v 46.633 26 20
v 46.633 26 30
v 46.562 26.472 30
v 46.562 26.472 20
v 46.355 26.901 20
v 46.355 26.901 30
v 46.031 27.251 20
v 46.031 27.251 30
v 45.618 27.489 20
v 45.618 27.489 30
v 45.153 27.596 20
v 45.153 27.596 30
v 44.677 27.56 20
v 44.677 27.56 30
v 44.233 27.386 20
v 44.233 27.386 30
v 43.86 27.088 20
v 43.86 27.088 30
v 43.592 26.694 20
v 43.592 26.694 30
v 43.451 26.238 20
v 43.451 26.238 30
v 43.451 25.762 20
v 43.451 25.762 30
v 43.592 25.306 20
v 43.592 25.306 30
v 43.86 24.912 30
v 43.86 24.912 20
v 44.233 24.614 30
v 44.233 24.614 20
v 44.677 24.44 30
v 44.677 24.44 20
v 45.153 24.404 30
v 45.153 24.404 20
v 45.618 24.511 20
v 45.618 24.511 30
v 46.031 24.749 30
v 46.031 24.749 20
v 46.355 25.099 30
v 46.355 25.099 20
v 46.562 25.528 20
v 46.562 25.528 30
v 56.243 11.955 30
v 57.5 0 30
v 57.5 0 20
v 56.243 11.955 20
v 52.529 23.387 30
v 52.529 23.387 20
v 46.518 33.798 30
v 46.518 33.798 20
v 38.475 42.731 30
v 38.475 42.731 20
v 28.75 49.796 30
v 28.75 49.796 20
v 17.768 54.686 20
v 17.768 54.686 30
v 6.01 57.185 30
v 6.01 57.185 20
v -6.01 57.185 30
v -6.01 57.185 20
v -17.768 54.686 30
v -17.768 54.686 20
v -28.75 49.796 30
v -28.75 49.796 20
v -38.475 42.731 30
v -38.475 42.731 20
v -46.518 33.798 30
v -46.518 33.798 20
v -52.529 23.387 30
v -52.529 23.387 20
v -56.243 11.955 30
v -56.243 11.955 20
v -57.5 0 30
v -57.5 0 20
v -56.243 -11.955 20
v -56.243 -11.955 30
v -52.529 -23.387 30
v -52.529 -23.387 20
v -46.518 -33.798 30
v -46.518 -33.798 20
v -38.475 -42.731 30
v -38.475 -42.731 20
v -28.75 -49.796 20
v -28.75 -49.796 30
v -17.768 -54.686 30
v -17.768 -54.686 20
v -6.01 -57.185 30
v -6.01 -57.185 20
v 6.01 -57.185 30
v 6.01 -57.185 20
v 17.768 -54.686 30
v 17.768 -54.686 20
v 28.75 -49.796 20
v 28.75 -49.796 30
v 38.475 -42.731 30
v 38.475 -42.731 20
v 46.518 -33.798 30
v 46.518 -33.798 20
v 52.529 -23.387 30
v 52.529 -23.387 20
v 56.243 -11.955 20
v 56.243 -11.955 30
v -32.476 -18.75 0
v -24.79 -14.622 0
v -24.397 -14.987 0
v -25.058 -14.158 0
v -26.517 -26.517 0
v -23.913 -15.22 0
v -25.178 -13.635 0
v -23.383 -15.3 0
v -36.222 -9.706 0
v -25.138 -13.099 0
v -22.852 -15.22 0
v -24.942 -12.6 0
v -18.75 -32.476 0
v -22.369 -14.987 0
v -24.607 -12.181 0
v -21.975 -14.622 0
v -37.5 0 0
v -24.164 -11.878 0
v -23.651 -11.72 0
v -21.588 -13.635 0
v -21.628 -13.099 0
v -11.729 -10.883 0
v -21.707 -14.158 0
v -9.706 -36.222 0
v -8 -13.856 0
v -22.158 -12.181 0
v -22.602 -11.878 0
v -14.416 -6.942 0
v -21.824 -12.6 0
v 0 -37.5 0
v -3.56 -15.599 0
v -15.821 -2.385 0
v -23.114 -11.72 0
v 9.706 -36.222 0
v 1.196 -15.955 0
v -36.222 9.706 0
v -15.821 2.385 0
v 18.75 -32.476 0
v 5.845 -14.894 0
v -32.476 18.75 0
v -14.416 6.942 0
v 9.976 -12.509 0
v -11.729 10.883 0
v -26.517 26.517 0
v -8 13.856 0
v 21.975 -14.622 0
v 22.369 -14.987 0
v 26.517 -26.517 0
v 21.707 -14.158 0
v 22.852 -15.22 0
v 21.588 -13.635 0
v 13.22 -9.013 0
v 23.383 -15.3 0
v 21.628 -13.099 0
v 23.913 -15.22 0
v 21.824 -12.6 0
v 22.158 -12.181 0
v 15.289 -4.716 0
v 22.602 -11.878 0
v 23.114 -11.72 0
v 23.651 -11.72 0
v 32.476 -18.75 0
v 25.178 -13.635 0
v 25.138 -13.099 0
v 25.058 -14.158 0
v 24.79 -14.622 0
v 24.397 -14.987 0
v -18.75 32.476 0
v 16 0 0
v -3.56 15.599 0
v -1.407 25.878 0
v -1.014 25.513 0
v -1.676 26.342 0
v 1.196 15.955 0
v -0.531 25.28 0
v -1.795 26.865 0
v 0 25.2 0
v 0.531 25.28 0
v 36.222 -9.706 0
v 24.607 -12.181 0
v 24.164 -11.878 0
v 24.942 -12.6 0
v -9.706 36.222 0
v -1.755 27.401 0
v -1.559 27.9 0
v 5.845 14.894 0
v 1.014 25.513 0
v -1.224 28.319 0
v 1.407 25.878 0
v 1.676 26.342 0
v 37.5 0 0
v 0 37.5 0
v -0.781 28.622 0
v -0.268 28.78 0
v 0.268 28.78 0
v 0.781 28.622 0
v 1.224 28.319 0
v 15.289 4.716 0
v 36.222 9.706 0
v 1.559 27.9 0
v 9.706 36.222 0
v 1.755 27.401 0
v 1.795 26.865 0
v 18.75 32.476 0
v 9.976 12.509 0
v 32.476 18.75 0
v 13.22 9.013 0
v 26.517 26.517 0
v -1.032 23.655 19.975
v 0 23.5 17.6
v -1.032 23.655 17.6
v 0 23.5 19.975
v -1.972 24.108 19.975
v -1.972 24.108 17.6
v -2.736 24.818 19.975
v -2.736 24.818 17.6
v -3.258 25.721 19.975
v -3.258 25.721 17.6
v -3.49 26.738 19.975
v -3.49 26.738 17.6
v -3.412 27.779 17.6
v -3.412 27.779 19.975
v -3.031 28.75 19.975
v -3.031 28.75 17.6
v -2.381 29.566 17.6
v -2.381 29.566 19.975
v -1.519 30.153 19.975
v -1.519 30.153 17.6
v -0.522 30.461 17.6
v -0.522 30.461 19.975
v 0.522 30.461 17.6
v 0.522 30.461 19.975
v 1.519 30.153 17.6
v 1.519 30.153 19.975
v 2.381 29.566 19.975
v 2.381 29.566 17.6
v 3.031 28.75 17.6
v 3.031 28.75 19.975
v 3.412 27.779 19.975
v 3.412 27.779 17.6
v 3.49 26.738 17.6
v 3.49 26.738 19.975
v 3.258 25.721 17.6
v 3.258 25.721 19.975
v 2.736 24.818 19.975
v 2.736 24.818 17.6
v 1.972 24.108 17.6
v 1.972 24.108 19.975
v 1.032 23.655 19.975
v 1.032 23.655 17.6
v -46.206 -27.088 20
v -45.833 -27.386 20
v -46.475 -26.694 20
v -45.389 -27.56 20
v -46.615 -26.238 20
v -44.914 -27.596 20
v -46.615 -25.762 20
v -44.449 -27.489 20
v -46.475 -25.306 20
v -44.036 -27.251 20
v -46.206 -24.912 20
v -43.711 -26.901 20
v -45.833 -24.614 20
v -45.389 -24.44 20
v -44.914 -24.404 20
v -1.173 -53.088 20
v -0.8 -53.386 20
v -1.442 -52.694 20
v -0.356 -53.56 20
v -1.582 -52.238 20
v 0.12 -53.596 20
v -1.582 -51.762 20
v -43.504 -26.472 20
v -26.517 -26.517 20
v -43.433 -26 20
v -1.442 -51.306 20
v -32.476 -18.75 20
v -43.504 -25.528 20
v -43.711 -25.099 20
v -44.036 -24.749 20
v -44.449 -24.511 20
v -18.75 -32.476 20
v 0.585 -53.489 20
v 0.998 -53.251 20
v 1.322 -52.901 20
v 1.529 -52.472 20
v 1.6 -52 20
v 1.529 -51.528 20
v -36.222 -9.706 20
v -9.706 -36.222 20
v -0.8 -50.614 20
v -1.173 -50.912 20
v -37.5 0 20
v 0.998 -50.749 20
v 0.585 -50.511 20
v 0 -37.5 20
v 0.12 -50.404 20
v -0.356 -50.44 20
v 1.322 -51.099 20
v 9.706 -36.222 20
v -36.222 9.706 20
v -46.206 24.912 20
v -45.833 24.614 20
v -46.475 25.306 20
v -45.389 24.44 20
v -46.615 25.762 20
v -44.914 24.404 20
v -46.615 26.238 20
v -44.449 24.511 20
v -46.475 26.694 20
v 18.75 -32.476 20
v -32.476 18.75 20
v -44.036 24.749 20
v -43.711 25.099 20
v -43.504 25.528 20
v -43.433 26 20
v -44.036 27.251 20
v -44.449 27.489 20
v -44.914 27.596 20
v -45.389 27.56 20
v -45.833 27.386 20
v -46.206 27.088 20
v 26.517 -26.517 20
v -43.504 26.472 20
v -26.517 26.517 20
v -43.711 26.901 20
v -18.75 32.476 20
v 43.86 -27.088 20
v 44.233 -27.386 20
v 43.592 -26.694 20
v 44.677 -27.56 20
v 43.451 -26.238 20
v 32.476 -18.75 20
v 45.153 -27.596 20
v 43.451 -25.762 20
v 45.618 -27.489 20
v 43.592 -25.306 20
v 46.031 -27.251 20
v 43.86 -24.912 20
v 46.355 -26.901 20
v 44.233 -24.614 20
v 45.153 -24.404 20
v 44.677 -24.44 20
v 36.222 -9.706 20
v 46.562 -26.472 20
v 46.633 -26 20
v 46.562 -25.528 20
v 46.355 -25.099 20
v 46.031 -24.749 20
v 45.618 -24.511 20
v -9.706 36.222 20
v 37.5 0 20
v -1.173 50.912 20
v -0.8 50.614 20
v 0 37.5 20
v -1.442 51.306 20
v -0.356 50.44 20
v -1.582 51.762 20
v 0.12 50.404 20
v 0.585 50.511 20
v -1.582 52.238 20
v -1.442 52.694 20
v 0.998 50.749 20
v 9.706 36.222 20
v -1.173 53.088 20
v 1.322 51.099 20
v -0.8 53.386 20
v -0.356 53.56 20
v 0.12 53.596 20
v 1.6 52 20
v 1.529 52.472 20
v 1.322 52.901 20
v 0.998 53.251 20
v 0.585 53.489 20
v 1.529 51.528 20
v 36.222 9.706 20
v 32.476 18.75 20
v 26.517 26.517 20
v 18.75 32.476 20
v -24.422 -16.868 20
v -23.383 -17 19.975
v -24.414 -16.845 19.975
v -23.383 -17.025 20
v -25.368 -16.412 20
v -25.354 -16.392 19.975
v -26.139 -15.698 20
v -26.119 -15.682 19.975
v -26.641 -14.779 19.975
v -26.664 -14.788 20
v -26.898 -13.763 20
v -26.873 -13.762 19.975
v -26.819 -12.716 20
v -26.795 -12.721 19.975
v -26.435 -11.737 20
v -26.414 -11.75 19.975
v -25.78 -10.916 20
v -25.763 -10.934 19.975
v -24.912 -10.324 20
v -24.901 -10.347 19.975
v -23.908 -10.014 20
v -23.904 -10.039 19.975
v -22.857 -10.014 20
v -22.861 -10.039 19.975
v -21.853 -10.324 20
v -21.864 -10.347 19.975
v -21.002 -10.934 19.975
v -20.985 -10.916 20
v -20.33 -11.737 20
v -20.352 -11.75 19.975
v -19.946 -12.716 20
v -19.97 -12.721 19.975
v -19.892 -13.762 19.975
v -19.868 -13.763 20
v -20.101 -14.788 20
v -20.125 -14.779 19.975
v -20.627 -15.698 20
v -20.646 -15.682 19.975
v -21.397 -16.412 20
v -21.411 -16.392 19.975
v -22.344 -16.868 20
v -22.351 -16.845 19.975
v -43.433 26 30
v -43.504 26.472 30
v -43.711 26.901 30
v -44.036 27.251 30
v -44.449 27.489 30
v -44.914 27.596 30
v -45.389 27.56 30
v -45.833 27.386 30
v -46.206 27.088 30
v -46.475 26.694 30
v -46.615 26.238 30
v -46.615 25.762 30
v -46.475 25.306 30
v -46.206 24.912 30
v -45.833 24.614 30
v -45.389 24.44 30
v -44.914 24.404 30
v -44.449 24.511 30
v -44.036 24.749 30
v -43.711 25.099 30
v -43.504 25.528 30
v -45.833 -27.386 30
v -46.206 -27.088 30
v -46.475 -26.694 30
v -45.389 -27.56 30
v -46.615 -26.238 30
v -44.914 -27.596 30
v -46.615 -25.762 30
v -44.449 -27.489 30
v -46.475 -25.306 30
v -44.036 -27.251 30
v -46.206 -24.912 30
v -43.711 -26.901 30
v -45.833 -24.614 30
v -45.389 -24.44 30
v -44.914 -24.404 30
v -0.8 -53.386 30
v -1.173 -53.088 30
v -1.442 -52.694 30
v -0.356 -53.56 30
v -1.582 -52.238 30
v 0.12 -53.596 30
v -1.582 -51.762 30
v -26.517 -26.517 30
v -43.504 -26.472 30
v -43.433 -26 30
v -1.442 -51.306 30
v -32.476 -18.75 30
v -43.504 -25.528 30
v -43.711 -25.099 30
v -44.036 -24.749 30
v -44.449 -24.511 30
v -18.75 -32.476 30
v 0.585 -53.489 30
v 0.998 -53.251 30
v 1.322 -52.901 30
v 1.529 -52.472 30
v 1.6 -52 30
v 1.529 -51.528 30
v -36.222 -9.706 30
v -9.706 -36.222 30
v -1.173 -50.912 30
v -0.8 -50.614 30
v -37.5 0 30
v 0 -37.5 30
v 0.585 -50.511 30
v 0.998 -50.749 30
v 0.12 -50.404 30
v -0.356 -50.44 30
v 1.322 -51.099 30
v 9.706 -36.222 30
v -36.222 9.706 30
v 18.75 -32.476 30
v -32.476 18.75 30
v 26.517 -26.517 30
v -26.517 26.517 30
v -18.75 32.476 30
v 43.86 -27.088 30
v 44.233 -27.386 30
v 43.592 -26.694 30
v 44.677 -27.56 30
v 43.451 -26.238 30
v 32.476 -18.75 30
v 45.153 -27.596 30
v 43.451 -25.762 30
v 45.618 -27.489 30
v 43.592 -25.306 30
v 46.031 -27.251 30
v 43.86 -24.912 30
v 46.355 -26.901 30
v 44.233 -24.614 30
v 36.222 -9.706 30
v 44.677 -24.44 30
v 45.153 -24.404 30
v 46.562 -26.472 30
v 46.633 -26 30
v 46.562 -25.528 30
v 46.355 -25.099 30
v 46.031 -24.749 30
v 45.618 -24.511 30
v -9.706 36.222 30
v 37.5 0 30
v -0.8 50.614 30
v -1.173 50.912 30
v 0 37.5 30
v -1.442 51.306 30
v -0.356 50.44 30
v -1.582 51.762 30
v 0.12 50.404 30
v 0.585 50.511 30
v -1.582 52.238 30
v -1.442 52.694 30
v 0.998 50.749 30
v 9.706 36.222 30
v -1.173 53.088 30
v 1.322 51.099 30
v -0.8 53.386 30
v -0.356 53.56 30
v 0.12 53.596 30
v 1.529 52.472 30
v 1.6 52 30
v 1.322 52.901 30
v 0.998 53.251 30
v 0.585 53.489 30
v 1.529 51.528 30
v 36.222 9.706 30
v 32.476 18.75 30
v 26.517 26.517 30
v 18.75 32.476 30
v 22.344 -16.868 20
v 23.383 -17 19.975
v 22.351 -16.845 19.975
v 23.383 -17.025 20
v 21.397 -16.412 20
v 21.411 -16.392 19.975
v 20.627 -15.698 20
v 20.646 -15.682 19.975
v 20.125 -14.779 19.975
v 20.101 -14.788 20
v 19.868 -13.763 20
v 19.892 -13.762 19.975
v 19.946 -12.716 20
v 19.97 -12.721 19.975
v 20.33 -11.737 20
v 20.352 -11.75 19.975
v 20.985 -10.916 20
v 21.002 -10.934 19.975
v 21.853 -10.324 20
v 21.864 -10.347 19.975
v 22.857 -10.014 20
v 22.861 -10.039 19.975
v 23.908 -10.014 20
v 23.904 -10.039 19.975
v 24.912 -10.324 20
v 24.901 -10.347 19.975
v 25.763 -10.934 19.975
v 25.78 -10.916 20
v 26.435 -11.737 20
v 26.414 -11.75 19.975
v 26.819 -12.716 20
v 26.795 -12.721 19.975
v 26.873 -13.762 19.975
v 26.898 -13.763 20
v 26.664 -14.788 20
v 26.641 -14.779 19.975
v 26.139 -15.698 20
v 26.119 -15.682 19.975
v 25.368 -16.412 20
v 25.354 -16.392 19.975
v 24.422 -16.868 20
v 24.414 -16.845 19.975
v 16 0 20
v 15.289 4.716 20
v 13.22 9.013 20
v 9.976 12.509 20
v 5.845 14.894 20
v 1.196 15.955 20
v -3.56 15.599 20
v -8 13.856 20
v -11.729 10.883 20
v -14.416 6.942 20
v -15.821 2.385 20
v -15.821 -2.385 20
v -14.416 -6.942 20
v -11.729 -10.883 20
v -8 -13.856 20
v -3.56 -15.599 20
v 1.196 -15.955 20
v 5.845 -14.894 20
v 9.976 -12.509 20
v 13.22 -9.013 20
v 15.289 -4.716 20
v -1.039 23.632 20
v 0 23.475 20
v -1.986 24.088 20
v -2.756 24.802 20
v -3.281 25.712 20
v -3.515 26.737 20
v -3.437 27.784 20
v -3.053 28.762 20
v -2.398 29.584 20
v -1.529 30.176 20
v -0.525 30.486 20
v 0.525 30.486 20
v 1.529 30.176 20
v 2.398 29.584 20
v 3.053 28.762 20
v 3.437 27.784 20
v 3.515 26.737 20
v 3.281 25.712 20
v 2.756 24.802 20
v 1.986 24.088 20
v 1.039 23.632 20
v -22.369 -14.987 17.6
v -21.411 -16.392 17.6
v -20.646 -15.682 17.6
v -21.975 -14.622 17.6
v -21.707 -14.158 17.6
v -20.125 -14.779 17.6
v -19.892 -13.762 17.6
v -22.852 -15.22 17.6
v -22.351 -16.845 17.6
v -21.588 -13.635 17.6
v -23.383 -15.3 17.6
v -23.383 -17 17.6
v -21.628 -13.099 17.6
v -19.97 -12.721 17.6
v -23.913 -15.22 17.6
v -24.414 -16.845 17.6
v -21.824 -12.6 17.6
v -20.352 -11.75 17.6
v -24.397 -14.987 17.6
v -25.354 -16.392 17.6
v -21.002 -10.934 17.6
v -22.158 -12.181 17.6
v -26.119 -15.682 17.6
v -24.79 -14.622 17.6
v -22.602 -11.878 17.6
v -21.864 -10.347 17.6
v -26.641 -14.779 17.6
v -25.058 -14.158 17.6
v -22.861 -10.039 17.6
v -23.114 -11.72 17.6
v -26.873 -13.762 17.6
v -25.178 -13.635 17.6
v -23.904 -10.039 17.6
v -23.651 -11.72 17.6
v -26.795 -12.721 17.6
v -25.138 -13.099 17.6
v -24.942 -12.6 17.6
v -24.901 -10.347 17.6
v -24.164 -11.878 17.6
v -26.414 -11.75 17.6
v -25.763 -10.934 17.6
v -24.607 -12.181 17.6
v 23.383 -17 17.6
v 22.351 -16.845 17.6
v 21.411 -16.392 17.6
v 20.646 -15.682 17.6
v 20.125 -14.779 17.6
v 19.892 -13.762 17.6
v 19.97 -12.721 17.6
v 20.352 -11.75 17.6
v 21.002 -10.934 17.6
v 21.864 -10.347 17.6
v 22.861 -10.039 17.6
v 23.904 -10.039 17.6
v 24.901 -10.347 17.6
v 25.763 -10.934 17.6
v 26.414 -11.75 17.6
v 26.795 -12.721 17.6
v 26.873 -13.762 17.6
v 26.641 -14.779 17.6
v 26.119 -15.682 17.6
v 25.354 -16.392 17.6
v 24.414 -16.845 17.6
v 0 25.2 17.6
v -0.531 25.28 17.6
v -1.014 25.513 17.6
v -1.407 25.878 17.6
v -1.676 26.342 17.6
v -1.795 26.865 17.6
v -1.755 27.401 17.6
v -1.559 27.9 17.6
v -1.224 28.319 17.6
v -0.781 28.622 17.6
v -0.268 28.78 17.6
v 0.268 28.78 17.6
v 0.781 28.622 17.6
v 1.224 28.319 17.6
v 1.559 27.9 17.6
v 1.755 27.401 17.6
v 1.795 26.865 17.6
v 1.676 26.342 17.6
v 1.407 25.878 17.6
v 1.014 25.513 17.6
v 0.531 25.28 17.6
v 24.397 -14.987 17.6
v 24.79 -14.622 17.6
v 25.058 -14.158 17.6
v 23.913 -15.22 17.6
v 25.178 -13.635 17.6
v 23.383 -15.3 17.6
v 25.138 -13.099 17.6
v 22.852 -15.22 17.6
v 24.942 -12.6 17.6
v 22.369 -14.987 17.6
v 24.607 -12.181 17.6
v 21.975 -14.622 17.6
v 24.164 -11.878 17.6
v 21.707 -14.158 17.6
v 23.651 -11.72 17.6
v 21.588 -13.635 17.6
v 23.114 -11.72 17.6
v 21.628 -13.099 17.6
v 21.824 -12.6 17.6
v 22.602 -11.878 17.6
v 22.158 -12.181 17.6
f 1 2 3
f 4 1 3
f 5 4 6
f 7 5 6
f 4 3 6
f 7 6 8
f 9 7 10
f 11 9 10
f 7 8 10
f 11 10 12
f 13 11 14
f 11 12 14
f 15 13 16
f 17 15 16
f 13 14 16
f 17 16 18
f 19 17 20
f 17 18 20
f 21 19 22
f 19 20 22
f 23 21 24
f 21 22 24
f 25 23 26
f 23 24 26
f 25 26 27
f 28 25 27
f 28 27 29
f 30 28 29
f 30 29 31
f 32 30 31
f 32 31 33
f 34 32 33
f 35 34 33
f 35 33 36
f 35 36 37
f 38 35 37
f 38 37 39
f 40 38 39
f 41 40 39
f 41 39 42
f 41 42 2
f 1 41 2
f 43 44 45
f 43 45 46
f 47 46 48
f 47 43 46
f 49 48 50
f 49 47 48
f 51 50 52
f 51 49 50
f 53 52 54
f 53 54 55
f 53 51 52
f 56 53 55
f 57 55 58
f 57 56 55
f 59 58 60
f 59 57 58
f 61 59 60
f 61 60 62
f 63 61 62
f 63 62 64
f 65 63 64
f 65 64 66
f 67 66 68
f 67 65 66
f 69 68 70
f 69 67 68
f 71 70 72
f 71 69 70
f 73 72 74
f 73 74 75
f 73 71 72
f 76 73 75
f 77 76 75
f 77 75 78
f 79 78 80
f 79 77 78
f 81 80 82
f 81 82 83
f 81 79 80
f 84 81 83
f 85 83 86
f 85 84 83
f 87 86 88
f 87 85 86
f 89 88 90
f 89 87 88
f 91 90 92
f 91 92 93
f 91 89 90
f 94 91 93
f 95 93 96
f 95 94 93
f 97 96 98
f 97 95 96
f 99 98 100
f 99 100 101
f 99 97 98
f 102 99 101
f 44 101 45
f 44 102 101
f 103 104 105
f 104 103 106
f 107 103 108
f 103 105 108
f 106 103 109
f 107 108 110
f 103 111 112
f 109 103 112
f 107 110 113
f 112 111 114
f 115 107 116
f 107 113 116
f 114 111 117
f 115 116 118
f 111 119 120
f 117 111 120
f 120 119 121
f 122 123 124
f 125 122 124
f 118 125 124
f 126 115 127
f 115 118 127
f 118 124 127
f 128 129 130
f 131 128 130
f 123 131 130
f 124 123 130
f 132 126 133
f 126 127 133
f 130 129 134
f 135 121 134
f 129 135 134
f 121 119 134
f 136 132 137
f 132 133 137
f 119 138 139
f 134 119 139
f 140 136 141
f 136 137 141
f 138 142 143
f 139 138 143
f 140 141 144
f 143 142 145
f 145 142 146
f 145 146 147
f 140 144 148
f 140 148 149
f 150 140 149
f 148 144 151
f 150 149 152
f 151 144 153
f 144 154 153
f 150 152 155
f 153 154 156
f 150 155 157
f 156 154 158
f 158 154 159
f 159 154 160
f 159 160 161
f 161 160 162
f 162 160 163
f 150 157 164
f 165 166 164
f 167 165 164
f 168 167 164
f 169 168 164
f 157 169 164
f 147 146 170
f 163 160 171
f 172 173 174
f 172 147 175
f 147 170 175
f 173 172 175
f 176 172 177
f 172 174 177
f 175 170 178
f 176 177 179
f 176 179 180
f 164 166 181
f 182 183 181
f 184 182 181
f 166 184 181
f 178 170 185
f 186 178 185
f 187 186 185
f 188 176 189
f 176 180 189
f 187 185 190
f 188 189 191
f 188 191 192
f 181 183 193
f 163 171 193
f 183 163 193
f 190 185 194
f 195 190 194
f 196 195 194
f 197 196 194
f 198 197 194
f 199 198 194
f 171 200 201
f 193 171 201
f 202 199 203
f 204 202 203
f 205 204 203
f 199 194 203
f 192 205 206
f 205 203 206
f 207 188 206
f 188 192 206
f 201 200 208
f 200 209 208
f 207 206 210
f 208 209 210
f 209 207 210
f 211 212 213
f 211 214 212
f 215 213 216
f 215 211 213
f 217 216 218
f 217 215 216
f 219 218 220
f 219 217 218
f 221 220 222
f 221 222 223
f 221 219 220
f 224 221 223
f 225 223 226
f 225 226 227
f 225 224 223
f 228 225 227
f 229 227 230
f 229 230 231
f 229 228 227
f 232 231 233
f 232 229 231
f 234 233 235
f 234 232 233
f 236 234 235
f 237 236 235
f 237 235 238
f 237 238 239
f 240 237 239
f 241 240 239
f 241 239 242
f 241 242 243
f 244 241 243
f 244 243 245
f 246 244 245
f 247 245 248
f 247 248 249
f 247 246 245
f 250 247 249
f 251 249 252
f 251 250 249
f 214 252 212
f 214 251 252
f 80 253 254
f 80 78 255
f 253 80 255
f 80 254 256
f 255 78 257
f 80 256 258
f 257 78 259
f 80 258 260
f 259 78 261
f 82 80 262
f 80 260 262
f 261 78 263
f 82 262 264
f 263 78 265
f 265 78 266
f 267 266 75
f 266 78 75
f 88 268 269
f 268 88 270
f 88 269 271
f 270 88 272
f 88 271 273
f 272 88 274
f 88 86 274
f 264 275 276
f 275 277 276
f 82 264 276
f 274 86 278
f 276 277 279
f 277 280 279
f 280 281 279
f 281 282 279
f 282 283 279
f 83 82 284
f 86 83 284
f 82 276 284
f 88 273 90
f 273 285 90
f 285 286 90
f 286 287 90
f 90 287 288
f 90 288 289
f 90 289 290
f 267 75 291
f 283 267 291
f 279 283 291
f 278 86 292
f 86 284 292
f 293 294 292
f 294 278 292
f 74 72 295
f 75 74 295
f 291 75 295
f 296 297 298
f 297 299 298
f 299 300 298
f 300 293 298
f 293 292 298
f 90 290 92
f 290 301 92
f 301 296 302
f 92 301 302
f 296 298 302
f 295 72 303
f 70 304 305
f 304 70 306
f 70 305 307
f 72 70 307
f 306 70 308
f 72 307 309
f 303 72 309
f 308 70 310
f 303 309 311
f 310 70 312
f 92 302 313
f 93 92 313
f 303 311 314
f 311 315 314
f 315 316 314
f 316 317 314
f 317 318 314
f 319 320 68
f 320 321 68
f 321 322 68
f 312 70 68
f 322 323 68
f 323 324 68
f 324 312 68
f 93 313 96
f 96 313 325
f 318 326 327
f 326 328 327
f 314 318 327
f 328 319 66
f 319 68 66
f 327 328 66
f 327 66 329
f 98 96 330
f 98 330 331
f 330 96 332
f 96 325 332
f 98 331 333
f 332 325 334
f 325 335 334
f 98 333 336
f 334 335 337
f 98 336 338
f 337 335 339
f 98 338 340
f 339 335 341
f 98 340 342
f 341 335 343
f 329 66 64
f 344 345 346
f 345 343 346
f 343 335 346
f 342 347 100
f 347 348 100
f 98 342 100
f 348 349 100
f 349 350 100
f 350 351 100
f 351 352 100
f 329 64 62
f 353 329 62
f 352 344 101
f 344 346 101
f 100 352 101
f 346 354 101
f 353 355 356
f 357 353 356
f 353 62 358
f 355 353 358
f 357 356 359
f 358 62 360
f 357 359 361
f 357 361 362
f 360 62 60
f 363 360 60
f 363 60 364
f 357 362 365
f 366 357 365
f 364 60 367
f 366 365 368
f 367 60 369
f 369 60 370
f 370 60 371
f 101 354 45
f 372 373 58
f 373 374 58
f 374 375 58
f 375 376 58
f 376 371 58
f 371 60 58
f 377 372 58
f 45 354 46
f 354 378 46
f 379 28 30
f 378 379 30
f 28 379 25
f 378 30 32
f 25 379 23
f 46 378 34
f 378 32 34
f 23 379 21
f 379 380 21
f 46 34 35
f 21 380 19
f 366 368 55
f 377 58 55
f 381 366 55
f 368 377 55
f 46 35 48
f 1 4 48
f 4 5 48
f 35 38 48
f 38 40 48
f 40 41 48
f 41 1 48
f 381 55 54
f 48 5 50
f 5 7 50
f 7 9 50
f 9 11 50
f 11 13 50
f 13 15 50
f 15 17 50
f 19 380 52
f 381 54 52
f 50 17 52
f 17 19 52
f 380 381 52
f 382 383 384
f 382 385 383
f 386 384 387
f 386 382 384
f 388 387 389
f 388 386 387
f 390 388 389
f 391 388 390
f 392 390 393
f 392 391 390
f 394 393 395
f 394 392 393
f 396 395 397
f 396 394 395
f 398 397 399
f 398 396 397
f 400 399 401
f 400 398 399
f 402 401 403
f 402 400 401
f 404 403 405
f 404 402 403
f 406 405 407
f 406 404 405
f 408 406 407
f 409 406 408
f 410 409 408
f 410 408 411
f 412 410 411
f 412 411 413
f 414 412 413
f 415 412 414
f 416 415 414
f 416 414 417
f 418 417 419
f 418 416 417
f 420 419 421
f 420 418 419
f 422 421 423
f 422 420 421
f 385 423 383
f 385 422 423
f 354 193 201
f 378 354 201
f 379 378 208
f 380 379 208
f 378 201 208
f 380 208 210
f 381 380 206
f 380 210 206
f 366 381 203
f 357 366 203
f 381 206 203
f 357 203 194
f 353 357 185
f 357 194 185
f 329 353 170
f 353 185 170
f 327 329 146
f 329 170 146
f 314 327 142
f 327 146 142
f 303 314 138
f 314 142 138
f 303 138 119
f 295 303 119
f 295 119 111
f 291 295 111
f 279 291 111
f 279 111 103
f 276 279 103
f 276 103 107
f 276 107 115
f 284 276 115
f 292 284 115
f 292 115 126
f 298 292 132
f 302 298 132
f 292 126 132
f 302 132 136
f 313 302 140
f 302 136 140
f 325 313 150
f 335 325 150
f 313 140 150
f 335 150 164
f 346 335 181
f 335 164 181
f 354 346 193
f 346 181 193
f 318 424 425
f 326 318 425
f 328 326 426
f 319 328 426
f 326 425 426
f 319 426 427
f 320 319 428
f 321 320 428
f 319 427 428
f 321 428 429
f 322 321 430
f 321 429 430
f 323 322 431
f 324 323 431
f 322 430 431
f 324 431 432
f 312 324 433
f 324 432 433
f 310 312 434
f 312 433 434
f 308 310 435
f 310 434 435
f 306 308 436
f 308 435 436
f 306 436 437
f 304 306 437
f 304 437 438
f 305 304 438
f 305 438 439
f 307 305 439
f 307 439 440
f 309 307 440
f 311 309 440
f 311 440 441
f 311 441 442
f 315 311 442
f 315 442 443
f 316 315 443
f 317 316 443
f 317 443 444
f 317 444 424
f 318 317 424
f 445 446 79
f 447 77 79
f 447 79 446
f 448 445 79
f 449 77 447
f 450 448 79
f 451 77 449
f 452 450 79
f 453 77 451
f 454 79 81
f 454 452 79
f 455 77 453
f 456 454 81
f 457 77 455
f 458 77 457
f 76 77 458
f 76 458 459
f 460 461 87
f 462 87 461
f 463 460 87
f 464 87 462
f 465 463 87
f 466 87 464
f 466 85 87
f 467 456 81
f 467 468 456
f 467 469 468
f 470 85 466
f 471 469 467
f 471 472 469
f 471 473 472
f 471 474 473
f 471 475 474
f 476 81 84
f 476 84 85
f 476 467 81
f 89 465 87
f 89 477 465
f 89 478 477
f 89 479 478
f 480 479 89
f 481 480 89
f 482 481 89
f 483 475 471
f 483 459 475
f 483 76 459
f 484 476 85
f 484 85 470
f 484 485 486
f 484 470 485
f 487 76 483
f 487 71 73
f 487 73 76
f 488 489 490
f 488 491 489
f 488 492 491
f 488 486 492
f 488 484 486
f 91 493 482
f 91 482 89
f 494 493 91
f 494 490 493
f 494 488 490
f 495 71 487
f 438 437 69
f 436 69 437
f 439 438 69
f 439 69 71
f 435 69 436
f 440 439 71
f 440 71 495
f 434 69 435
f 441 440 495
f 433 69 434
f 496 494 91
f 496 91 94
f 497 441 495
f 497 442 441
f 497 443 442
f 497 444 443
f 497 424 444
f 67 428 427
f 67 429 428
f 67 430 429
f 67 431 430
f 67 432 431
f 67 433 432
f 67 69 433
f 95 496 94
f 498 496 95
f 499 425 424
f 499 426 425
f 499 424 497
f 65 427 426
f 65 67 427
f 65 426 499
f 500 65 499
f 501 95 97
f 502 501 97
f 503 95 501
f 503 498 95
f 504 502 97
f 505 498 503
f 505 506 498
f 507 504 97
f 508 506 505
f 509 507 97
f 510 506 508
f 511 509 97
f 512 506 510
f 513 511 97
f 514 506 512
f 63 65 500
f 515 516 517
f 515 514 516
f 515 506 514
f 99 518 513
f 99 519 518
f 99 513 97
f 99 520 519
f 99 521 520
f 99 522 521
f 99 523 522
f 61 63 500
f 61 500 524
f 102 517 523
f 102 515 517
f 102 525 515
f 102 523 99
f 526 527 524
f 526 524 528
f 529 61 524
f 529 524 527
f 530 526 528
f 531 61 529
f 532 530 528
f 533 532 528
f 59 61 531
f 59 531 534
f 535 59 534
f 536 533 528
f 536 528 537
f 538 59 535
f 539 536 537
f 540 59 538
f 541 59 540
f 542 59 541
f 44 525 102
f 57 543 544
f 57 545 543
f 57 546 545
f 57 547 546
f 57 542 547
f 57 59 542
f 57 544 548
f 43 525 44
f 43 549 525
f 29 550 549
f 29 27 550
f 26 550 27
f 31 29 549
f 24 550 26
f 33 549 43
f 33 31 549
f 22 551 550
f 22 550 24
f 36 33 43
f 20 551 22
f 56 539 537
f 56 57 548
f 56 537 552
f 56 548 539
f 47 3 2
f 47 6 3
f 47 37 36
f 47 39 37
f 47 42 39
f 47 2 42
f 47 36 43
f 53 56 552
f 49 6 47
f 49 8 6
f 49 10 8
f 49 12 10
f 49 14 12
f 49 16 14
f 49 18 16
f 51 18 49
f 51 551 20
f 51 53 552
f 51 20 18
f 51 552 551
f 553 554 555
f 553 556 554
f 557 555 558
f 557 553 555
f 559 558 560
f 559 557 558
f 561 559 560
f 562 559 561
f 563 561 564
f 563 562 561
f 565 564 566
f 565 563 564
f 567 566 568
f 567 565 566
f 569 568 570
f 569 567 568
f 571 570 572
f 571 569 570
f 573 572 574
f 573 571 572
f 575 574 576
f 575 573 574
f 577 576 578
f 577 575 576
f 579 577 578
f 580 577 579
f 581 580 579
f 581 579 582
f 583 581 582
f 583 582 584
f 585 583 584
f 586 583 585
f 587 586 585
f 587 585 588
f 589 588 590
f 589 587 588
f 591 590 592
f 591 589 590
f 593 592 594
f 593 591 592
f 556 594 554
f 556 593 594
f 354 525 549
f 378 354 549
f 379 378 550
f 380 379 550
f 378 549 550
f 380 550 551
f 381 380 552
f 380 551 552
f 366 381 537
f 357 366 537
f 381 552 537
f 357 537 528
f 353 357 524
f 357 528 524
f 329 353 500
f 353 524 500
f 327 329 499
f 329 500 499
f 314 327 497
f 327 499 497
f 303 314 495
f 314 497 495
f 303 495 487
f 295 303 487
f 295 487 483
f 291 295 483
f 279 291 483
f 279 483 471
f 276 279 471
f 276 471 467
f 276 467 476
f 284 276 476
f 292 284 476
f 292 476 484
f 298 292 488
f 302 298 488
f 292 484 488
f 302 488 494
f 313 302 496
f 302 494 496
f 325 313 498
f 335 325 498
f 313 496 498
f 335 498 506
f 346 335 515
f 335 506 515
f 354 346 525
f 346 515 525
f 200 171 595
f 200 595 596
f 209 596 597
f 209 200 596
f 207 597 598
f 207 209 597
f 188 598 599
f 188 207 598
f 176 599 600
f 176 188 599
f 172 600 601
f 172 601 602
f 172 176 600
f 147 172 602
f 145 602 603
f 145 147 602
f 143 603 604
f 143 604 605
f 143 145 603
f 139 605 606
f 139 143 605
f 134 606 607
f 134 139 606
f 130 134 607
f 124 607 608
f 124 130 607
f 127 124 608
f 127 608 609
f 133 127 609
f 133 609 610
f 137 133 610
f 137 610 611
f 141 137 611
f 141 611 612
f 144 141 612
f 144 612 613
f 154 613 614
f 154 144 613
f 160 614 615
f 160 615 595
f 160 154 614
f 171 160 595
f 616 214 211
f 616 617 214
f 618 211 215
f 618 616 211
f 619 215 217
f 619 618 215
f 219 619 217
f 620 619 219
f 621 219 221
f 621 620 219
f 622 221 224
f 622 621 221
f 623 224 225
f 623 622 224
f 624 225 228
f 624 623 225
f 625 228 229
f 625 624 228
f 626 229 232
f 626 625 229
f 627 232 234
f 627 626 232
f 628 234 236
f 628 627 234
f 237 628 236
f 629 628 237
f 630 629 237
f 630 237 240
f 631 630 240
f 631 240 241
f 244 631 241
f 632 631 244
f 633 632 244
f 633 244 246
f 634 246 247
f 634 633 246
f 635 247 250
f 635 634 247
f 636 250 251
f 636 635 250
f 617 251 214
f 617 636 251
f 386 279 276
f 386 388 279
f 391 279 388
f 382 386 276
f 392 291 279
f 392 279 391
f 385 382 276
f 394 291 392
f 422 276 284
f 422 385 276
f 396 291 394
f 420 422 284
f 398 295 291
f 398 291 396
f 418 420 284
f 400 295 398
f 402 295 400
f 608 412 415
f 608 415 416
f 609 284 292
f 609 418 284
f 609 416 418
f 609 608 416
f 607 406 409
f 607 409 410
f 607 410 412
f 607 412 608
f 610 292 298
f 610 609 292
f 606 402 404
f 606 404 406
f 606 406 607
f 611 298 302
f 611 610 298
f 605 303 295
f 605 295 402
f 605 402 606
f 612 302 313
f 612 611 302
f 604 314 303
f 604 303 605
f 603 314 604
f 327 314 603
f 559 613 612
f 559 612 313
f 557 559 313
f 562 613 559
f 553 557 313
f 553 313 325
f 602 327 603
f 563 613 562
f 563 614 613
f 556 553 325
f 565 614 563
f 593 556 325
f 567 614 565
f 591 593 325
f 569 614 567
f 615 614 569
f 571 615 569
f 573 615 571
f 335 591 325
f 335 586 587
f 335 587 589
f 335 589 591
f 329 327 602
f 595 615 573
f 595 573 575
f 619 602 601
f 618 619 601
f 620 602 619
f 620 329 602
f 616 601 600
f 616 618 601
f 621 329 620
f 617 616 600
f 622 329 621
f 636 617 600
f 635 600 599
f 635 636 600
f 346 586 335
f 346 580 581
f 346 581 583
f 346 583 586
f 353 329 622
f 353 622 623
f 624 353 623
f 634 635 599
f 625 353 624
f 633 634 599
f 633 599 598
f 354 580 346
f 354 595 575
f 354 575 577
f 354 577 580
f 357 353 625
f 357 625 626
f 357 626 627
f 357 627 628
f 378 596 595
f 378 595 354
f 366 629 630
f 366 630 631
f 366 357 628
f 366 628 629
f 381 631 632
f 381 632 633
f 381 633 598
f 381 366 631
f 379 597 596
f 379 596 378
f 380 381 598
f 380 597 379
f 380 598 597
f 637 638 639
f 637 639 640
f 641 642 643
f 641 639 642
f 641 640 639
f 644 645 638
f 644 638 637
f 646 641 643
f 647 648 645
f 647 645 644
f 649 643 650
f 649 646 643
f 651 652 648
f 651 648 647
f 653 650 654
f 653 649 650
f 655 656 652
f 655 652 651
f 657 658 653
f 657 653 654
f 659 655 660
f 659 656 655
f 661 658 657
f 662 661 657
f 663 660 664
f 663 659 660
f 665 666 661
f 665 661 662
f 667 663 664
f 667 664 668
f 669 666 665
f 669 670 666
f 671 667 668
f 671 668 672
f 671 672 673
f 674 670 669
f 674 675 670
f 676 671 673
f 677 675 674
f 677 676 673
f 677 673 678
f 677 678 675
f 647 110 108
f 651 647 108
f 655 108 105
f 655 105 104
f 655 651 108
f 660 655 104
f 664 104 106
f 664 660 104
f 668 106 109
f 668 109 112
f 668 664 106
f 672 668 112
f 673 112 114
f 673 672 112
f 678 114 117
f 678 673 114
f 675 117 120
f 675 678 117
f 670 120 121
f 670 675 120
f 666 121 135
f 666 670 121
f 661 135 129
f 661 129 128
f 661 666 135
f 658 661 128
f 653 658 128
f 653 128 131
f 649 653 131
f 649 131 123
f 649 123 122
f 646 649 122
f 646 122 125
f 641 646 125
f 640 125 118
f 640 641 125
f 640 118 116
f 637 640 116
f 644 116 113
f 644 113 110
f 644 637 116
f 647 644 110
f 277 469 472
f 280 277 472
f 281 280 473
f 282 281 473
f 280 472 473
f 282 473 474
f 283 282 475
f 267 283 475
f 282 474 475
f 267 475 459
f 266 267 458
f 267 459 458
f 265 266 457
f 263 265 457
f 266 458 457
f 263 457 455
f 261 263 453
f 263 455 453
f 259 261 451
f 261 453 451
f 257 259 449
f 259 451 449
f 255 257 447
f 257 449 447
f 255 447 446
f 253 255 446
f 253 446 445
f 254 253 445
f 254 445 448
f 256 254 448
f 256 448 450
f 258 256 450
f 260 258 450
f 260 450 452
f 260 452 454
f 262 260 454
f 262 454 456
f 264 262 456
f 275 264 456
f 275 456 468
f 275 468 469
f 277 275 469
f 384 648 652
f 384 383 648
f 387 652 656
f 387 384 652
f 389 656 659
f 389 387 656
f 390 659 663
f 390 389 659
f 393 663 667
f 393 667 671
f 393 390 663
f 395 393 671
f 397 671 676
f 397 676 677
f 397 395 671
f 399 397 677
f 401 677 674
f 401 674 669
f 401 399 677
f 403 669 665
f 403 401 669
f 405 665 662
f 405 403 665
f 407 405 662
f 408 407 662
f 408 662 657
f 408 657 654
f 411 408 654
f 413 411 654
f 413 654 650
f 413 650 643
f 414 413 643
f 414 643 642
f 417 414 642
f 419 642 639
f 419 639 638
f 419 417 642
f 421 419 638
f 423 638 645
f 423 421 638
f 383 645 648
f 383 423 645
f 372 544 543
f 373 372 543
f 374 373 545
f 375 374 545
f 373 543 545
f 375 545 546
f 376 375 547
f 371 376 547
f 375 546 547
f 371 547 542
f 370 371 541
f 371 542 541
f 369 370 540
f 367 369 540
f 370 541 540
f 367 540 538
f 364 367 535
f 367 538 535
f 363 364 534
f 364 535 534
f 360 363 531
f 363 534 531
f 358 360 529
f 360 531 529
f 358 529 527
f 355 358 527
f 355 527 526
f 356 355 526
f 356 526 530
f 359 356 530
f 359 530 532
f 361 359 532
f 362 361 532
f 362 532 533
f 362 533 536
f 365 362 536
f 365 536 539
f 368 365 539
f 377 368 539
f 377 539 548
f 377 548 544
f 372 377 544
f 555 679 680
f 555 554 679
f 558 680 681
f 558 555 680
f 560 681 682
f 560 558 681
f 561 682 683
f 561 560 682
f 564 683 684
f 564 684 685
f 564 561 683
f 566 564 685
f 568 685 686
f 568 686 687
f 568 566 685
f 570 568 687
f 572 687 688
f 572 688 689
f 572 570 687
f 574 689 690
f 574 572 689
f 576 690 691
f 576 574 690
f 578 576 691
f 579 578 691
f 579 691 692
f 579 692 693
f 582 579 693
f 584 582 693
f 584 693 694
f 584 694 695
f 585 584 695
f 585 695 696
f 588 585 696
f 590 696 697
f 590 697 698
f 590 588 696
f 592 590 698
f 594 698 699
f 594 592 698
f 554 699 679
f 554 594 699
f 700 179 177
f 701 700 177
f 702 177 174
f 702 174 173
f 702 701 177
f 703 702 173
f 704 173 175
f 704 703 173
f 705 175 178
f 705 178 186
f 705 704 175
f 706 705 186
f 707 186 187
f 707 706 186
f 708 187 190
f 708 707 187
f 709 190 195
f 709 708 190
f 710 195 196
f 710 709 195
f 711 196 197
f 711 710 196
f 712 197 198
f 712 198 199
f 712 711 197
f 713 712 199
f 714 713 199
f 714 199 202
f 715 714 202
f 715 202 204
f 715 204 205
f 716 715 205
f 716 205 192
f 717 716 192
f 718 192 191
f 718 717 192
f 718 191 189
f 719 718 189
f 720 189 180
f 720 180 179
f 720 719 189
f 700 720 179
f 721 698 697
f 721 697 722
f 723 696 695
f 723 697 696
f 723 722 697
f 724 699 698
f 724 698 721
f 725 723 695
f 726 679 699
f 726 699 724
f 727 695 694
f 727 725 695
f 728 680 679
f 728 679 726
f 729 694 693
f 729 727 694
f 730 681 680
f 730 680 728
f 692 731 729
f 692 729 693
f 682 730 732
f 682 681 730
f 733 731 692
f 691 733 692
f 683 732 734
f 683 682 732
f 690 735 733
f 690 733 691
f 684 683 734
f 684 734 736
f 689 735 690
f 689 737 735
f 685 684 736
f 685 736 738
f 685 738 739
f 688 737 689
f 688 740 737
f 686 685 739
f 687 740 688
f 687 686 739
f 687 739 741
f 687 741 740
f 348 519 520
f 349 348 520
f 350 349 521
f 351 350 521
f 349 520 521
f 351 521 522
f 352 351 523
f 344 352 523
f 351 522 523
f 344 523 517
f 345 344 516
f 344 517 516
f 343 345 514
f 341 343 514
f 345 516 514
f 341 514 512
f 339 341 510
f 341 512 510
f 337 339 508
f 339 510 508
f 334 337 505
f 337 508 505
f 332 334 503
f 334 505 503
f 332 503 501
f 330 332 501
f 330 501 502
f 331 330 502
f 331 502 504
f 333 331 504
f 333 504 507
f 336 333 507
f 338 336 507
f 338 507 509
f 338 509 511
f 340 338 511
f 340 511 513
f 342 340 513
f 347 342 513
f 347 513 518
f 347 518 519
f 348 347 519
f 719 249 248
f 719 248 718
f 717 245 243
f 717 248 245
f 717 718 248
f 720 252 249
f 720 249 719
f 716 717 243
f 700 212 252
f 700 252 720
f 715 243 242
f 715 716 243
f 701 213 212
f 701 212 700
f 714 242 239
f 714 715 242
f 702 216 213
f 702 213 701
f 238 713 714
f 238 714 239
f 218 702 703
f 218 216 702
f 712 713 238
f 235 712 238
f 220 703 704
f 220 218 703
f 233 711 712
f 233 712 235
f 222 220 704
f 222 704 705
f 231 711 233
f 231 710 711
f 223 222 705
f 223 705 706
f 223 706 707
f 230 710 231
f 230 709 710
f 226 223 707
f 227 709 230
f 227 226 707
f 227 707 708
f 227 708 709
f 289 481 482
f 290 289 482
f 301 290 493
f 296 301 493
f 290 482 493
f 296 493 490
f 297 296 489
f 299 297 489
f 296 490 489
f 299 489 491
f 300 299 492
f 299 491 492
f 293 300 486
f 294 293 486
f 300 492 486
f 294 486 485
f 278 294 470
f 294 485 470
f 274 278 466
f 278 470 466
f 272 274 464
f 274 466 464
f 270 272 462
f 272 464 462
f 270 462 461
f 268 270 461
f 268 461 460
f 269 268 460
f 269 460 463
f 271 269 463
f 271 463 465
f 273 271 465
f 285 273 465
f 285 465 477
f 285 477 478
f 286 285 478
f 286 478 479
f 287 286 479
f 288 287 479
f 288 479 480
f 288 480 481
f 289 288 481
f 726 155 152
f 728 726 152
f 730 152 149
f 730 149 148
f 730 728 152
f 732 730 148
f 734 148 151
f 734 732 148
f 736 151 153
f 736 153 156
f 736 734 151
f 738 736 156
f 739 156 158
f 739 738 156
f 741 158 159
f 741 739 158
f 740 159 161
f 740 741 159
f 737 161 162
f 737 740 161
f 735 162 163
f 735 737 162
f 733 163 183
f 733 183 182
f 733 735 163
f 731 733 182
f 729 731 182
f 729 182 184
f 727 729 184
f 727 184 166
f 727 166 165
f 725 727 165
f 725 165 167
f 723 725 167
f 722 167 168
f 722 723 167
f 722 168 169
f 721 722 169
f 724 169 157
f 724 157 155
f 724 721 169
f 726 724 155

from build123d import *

# Parameters (mm, degrees)
SKETCH1_R                                     = 37.5
SKETCH1_R_2                                   = 16
BOSS_EXTRUDE1_DEPTH                           = 20
CBORE_FOR_M3_PAN_HEAD_MACHINE_SCREW1_AT_COUNT = 2
CBORE_FOR_M3_PAN_HEAD_MACHINE_SCREW1_AT_PITCH = 46.765371804
CBORE_FOR_M3_PAN_HEAD_MACHINE_SCREW1_2_COUNT  = 2
CBORE_FOR_M3_PAN_HEAD_MACHINE_SCREW1_2_PITCH  = 46.765371804
SKETCH8_R                                     = 57.5
SKETCH8_R_2                                   = 37.5
BOSS_EXTRUDE3_DEPTH                           = 10
SKETCH9_R                                     = 1.6
CUT_EXTRUDE1_DEPTH                            = 87.674679117


with BuildPart() as part:
    # Sketch1 → Boss-Extrude1 (new body)
    with BuildSketch(Plane.XY):
        Circle(SKETCH1_R)
        Circle(SKETCH1_R_2, mode=Mode.SUBTRACT)
    extrude(amount=BOSS_EXTRUDE1_DEPTH)

    # Sketch3 → CBORE for M3 Pan Head Machine Screw1 (revolve, cut)
    with BuildSketch(Plane(origin=(0, 27, 20), x_dir=(0, -1, 0), z_dir=(1, 0, 0))):
        Polygon((0, 0), (0, 20), (1.8, 20), (1.8, 2.4), (3.5, 2.4), (3.5, 0.025), (3.525, 0), align=None)
    cbore_for_m3_pan_head_machine_screw1 = revolve(axis=Axis((0, 27, 26.35), (0, 0, -1)), mode=Mode.SUBTRACT)

    # CBORE for M3 Pan Head Machine Screw1 at: CBORE for M3 Pan Head Machine Screw1 ×2
    with Locations(*[Vector(-0.500000000000001, -0.8660254037844382, 0) * (i * CBORE_FOR_M3_PAN_HEAD_MACHINE_SCREW1_AT_PITCH) for i in range(1, CBORE_FOR_M3_PAN_HEAD_MACHINE_SCREW1_AT_COUNT)]):
        add(cbore_for_m3_pan_head_machine_screw1, mode=Mode.SUBTRACT)

    # CBORE for M3 Pan Head Machine Screw1 2: CBORE for M3 Pan Head Machine Screw1 ×2
    with Locations(*[Vector(0.5000000000000012, -0.866025403784438, 0) * (i * CBORE_FOR_M3_PAN_HEAD_MACHINE_SCREW1_2_PITCH) for i in range(1, CBORE_FOR_M3_PAN_HEAD_MACHINE_SCREW1_2_COUNT)]):
        add(cbore_for_m3_pan_head_machine_screw1, mode=Mode.SUBTRACT)


with BuildPart() as body_2:
    # Sketch8 → Boss-Extrude3 (new body)
    with BuildSketch(Plane.XY.offset(30)):
        Circle(SKETCH8_R)
        Circle(SKETCH8_R_2, mode=Mode.SUBTRACT)
    extrude(amount=-BOSS_EXTRUDE3_DEPTH)

    # Sketch9 → Cut-Extrude1 (cut, through all)
    with BuildSketch(Plane.XY.offset(30)):
        with Locations((0, 52)):
            Circle(SKETCH9_R)
        with Locations((45.033320997, 26)):
            Circle(SKETCH9_R)
        with Locations((45.033320997, -26)):
            Circle(SKETCH9_R)
        with Locations((0, -52)):
            Circle(SKETCH9_R)
        with Locations((-45.033320997, -26)):
            Circle(SKETCH9_R)
        with Locations((-45.033320997, 26)):
            Circle(SKETCH9_R)
    extrude(amount=-CUT_EXTRUDE1_DEPTH, mode=Mode.SUBTRACT)


solid = Compound([part.part, body_2.part])
